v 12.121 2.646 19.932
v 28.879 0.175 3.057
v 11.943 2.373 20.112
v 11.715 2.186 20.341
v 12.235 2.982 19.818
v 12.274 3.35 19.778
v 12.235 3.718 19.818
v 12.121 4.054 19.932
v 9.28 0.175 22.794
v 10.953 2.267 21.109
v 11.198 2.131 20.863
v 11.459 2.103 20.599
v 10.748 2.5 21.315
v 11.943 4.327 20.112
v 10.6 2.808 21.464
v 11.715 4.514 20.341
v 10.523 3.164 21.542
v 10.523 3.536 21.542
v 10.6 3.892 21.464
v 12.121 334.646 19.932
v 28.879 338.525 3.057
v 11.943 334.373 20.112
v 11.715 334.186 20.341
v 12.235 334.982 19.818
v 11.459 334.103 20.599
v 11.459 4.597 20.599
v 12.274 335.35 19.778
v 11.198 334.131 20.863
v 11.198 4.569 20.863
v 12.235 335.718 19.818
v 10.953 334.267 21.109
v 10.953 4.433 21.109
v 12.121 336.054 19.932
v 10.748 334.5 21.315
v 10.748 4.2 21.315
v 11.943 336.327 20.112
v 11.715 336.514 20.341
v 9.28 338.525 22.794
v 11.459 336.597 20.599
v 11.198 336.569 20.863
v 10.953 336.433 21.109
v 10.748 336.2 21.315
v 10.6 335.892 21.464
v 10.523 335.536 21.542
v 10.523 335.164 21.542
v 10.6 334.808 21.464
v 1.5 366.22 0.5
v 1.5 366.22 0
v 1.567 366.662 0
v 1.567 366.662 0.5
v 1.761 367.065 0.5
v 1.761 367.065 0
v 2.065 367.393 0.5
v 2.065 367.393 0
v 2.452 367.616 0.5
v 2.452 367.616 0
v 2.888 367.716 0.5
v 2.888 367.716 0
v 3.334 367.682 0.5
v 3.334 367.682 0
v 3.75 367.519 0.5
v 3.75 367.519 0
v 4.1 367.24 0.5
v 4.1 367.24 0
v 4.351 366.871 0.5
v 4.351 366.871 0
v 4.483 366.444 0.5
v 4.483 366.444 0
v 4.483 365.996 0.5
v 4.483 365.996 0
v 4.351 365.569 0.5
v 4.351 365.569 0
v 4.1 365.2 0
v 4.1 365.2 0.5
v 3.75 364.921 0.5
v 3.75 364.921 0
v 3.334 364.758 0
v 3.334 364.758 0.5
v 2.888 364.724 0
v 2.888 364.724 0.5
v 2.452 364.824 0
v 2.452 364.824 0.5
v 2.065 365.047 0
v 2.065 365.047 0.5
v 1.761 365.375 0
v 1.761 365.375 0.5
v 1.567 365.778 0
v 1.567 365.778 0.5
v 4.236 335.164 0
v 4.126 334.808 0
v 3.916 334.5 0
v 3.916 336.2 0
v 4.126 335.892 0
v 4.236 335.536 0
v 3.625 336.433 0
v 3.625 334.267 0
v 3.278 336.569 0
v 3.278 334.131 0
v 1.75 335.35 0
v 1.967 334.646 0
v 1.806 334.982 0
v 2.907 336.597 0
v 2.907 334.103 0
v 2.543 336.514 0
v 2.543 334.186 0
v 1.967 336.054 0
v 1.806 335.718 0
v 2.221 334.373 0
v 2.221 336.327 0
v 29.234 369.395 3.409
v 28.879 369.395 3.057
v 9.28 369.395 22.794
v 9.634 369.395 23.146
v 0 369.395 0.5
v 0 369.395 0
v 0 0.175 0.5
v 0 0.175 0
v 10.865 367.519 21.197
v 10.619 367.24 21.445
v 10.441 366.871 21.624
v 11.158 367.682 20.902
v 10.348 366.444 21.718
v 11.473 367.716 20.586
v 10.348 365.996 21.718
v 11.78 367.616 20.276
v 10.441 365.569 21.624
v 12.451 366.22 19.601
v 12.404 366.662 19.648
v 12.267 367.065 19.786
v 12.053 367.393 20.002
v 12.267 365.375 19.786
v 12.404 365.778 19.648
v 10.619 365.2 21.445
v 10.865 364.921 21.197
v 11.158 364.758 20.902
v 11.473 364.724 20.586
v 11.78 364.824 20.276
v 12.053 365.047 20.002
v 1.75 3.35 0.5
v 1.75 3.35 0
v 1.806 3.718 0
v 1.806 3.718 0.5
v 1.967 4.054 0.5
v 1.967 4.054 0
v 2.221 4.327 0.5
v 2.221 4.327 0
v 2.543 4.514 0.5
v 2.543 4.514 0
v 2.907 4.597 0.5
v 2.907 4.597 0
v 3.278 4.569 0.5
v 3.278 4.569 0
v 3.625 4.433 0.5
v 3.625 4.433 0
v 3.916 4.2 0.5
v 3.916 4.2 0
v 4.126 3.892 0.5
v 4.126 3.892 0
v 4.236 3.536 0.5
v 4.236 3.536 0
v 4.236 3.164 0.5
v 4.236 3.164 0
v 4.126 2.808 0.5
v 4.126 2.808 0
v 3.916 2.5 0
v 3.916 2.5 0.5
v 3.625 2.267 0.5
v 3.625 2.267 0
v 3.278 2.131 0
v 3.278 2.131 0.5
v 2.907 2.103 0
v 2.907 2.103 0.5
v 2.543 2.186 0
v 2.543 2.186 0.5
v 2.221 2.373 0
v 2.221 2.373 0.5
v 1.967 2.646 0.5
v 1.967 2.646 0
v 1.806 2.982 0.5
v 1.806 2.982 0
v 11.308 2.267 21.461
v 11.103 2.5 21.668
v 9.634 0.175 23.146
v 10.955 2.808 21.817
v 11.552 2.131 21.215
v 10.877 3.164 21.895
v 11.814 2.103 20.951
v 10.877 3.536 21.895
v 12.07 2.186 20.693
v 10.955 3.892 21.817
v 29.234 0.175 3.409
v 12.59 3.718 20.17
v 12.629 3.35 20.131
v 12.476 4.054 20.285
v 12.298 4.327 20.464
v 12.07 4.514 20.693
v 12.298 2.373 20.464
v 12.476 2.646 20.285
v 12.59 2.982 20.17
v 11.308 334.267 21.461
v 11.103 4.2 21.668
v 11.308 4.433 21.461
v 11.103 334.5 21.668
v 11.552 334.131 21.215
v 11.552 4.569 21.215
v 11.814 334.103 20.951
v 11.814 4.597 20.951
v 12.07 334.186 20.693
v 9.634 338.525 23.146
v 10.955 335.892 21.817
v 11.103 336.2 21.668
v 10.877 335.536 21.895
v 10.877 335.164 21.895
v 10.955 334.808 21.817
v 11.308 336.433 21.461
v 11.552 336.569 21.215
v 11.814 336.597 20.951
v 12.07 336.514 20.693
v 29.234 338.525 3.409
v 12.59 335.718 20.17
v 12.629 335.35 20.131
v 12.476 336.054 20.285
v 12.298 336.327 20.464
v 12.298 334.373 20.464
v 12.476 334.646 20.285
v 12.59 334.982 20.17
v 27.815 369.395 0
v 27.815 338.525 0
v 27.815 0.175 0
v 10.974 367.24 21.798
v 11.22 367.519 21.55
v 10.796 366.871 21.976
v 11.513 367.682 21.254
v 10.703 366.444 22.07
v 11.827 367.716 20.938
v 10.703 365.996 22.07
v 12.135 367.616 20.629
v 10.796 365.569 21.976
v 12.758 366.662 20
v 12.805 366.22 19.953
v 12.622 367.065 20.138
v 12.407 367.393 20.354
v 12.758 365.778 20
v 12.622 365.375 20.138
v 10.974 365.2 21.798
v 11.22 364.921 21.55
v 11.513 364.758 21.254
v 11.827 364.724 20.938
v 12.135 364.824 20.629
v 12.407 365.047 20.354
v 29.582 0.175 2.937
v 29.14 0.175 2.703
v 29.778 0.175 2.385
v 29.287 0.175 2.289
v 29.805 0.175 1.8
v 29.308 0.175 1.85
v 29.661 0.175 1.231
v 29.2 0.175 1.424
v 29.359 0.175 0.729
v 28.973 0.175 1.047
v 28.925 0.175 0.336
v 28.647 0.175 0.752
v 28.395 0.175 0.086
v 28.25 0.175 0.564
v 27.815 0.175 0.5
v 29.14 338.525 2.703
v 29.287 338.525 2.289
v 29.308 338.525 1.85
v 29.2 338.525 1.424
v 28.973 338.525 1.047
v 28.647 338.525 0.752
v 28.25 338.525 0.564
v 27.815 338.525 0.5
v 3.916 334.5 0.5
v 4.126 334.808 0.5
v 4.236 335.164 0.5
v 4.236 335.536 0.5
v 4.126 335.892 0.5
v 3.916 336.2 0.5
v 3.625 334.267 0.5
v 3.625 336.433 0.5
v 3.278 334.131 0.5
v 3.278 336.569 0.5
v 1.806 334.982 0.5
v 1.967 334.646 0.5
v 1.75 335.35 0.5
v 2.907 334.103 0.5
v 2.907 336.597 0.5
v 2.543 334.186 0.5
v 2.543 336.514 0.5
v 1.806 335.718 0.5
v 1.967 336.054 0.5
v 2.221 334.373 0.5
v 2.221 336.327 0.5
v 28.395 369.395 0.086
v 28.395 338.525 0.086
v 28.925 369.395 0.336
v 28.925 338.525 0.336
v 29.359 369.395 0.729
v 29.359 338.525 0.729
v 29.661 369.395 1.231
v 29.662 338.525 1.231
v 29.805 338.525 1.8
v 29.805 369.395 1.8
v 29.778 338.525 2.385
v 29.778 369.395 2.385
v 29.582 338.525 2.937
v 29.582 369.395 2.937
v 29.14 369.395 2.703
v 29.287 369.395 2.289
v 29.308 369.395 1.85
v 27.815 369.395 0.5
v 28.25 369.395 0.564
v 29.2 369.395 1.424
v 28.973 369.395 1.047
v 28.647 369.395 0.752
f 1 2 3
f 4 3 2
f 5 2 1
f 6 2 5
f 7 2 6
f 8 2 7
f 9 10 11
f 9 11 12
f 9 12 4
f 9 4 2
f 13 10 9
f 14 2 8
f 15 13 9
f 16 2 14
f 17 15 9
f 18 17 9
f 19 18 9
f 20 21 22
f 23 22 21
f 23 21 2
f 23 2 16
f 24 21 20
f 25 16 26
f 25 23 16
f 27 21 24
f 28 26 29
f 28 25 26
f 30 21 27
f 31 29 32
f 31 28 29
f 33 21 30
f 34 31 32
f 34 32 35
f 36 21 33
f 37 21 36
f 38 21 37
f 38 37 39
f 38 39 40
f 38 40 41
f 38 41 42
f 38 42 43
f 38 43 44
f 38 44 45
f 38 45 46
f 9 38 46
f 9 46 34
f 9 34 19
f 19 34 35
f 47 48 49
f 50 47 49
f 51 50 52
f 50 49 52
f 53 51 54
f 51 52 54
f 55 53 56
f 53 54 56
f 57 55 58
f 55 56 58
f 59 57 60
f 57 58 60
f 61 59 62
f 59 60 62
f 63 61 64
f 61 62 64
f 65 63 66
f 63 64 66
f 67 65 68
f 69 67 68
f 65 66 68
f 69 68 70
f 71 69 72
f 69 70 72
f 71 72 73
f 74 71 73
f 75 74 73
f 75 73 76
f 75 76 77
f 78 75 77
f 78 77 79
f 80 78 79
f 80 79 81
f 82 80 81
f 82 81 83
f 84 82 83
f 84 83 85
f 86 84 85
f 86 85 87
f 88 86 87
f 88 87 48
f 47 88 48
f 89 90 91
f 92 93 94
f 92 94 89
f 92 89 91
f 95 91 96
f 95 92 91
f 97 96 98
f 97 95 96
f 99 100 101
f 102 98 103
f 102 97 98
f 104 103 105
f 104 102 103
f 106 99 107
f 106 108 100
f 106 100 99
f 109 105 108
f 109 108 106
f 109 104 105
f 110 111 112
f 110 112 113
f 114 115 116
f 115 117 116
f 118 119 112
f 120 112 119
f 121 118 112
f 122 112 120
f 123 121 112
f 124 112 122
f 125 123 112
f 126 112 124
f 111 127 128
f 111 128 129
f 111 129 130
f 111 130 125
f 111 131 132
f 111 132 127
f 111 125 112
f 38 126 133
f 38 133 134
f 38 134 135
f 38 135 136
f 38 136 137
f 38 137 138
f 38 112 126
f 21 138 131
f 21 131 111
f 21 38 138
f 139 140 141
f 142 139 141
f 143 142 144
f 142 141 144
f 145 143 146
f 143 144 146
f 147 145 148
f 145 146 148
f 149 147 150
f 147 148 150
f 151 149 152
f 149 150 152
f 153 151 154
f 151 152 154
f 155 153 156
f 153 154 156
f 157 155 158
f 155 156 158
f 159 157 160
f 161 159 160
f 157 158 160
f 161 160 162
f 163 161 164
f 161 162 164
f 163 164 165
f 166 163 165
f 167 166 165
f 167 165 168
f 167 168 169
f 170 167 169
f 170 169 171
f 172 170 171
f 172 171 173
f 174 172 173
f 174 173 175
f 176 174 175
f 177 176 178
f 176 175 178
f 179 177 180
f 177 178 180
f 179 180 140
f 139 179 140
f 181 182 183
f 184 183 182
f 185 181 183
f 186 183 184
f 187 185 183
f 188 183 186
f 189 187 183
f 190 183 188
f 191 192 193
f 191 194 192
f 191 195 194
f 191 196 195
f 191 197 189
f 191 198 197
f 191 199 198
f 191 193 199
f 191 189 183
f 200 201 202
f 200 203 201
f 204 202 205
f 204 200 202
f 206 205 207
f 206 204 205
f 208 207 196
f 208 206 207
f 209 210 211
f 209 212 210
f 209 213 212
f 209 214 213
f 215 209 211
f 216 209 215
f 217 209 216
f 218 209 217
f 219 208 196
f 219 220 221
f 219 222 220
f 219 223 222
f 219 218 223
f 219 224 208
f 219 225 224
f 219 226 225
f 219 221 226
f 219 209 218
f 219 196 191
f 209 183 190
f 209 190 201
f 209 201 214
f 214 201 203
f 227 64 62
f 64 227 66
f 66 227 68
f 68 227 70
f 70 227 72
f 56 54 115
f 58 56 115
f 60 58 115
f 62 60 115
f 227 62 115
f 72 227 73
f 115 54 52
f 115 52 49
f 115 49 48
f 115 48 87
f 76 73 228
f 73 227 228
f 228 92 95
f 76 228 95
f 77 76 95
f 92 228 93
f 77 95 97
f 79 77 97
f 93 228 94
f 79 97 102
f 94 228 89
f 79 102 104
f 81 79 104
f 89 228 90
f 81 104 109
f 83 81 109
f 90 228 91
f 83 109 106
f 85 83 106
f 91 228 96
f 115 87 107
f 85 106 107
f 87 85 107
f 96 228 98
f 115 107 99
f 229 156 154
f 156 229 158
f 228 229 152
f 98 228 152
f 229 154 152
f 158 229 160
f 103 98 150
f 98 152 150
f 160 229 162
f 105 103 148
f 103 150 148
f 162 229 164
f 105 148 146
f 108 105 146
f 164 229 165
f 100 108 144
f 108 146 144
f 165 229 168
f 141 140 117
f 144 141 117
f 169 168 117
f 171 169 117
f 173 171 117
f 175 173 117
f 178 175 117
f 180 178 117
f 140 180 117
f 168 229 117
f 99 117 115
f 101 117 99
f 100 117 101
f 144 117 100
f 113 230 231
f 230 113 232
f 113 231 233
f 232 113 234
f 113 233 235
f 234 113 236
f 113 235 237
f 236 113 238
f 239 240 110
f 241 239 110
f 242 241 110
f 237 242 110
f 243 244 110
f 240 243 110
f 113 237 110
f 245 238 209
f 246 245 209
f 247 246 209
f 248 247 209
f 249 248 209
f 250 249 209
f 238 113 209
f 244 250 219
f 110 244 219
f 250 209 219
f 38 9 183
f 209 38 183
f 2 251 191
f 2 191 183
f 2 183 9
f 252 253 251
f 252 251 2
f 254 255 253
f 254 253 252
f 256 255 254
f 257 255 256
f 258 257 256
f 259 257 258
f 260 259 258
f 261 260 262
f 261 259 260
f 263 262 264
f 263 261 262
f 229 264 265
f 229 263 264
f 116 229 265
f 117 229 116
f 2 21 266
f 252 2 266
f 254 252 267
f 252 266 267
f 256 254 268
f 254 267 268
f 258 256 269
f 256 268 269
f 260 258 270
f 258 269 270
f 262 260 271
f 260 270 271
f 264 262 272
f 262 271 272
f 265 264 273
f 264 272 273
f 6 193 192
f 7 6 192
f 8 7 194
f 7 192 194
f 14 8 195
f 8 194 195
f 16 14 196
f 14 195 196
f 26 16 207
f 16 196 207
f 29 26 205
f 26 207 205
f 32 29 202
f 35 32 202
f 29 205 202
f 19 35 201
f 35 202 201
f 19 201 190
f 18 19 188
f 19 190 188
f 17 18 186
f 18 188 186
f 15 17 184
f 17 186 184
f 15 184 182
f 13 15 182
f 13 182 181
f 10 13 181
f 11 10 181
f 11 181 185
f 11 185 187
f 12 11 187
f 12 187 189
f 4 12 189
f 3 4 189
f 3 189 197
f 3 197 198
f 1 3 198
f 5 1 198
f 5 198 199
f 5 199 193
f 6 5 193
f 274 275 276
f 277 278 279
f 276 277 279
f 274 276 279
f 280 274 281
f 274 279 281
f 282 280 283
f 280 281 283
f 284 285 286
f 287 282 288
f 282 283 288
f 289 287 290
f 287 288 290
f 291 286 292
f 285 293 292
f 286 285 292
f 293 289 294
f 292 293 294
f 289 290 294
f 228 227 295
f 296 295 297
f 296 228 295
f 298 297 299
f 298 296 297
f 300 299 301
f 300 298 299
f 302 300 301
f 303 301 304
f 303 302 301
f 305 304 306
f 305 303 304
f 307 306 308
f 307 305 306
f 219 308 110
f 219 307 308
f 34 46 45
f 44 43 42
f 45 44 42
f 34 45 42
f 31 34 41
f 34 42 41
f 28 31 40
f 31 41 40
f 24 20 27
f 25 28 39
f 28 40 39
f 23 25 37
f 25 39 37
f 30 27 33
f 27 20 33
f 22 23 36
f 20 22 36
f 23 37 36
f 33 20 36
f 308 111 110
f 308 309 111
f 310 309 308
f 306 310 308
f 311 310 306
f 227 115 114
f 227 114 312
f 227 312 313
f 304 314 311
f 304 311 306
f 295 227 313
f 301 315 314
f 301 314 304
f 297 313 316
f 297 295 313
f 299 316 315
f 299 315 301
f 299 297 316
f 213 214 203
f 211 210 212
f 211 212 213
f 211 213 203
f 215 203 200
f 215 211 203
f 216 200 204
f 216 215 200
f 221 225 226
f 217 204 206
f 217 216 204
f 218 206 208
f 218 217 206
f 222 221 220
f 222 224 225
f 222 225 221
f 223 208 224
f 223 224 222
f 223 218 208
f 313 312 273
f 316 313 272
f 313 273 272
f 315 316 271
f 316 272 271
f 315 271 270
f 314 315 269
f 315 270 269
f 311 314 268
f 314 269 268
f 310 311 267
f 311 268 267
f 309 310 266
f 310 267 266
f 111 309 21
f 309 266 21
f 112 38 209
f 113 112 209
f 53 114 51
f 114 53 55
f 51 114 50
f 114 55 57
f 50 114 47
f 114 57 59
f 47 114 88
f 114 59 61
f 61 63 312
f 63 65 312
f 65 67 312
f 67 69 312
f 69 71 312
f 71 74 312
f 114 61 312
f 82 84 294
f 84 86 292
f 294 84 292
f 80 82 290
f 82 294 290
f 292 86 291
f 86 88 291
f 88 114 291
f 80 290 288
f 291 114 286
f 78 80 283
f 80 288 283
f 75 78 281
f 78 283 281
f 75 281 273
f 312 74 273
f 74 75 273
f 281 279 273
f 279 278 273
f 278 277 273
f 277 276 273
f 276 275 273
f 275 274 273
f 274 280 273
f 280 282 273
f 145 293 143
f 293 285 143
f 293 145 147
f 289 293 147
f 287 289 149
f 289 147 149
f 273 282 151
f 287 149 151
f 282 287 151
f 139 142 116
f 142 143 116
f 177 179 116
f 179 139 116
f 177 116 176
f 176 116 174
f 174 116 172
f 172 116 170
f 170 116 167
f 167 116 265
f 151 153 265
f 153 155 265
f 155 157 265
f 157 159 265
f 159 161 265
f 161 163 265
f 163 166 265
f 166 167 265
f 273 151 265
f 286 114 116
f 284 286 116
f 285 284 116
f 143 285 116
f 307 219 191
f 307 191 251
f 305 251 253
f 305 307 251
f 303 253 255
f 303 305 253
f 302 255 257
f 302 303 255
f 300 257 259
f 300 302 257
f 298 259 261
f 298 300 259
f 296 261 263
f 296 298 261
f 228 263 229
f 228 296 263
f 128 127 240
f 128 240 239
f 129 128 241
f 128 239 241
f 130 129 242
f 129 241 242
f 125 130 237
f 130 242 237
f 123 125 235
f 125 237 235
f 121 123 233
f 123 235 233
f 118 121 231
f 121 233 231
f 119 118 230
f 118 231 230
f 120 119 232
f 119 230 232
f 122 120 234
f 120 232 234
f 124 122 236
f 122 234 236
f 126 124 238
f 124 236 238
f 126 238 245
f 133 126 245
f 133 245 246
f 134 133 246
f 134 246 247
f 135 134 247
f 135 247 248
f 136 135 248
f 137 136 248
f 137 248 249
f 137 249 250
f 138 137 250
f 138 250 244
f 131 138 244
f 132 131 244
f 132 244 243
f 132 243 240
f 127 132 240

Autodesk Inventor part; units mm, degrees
ref_plane "YZ Plane" through (0, 0, 0) normal (1, 0, 0) x (0, 1, 0)
ref_plane "XZ Plane" through (0, 0, 0) normal (0, 1, 0) x (-1, 0, 0)
ref_plane "XY Plane" through (0, 0, 0) normal (0, 0, 1) x (1, 0, 0)
sketch "Sketch1" plane through (0, 0, 0) normal (0, 0, 1) x (1, 0, 0)
  line L0 (0, 0) -> (27.815, 0)
  line L1 (27.815, 0) -> (27.815, 338.525)
  line L2 (27.815, 338.525) -> (0, 338.525)
  line L3 (0, 338.525) -> (0, 0)
  dimension "d0" = 27.815
  dimension "d1" = 338.525
extrude "Plate1" add sketch "Sketch1" along normal blind 0.5
sketch "Sketch2" plane through (28.8794, 338.525, 3.057) normal (0.7095707, 0, 0.7046342) x (0, 1, 0)
  line L0 (-338.525, 0) -> (0, 0)
  line L1 (0, 0) -> (0, 27.8153)
  line L2 (0, 27.8153) -> (-338.525, 27.8153)
  line L3 (-338.525, 27.8153) -> (-338.525, 0)
edge flange "Flange1" height 32.62 angle 134.8 thickness 0.5 bend radius 1.5 thickness toward (0.7095707, 0, 0.7046342) relief tear relief width 0.5 relief depth 0.25 edges at (27.815, 169.2625, 0.5) wall of the first edge with corners at (28.8794, 0, 3.057) (28.8794, 338.525, 3.057) (9.2797, 338.525, 22.7939) (9.2797, 0, 22.7939)
bend "Bend1"
corner "Corner1"
sketch "Sketch3" plane through (9.6345, 0, 23.1462) normal (0.7095707, 0, 0.7046342) x (0.7046342, 0, -0.7095707)
  line L0 (0, 338.525) -> (27.8153, 338.525) projected
  line L1 (27.8153, 0) -> (0, 0) projected
  line L2 (0, 0) -> (3, 0) construction
  line L3 (3, 0) -> (3, 3.175) construction
  line L4 (0, 338.525) -> (3, 338.525)
  line L5 (3, 338.525) -> (3, 335.35) construction
  circle A0 centre (3, 335.35) radius 1.25
  line L6 (3, 3.175) -> (3, 3.35) construction
  circle A1 centre (3, 3.35) radius 1.25
  point P0 (9.635, 0)
  dimension "d13" = 3
  dimension "d14" = 3.175
  dimension "d16" = 3
  dimension "d17" = 3.175
  dimension "d18" = 2.5
  dimension "d34" = 0.175
  dimension "d35" = 2.5
extrude "Extrusion1" cut sketch "Sketch3" against normal blind 10
sketch "Sketch4" plane through (0, 0, 0) normal (0, 0, -1) x (-1, 0, 0)
  line L0 (0, 0) -> (-27.815, 0) projected
  line L1 (0, 0) -> (-3, 0) construction
  line L2 (-3, 0) -> (-3, 3.175) construction
  line L3 (0, 338.525) -> (-3, 338.525) construction
  line L4 (0, 338.525) -> (-27.815, 338.525) construction
  line L5 (-3, 338.525) -> (-3, 335.35) construction
  circle A0 centre (-3, 335.35) radius 1.25
  line L6 (-3, 3.175) -> (-3, 3.35) construction
  circle A1 centre (-3, 3.35) radius 1.25
  dimension "d21" = 3
  dimension "d22" = 3.175
  dimension "d24" = 3
  dimension "d25" = 3.175
  dimension "d26" = 2.5
  dimension "d32" = 0.175
  dimension "d33" = 2.5
extrude "Extrusion2" cut sketch "Sketch4" against normal blind 10
sketch "Sketch5" plane through (0, 0, 0) normal (0, 0, -1) x (-1, 0, 0)
  line L0 (0, 0) -> (-49.0059, 0)
  line L1 (-49.0059, 0) -> (-49.0059, 0.175)
  line L2 (-49.0059, 0.175) -> (0, 0.175)
  line L3 (0, 0.175) -> (0, 0)
  dimension "d29" = 0.175
extrude "Extrusion3" cut sketch "Sketch5" against normal blind 100
sketch "Sketch6" plane through (0, 338.525, 0) normal (0, 1, 0) x (1, 0, 0)
  line L0 (0, -0.5) -> (27.815, -0.5) projected
  line L1 (27.815, 0) -> (27.815, -0.5) projected
  line L2 (27.815, 0) -> (0, 0) projected
  line L3 (0, 0) -> (0, -0.5) projected
extrude "Extrusion4" add sketch "Sketch6" along normal blind 30.87
sketch "Sketch7" plane through (27.815, 338.525, 0.5) normal (0, 1, 0) x (1, 0, 0)
  line L0 (1.4191, -2.9093) -> (1.0644, -2.557) projected
  arc A0 (1.4191, -2.9093) -> (0, 0.5) centre (0, -1.5) ccw projected
  line L1 (0, 0.5) -> (0, 0) projected
  arc A1 (1.0644, -2.557) -> (0, 0) centre (0, -1.5) ccw projected
  point P0 (-27.815, 0.5)
extrude "Extrusion5" add sketch "Sketch7" along normal blind 30.87
sketch "Sketch8" plane through (9.2797, 338.525, 22.7939) normal (0, 1, 0) x (0.7095707, 0, 0.7046342)
  line L0 (0.5, 27.8153) -> (0, 27.8153) projected
  line L1 (0, 0) -> (0, 27.8153) projected
  line L2 (0, 0) -> (0.5, 0) projected
  line L3 (0.5, 0) -> (0.5, 27.8153) projected
  point P0 (-22.646, 9.635)
extrude "Extrusion6" add sketch "Sketch8" along normal blind 30.87
sketch "Sketch9" plane through (29.2341, 0.175, 3.4093) normal (0.7095707, 0, 0.7046342) x (0.7046342, 0, -0.7095707)
  circle A0 centre (-24.8153, 335.175) radius 1.25 projected
  point P0 (-18.1803, -0.175)
extrude "Extrusion7" add sketch "Sketch9" against normal up to surface (0.5 mm away)
sketch "Sketch10" plane through (0, 0, 0) normal (0, 0, -1) x (-1, 0, 0)
  circle A0 centre (-3, 335.35) radius 1.25 projected
  point P0 (0, 0)
extrude "Extrusion8" add sketch "Sketch10" against normal up to surface (0.5 mm away)
sketch "Sketch11" plane through (0, 0, 0) normal (0, 0, -1) x (-1, 0, 0)
  line L0 (0, 0.175) -> (0, 369.395) projected
  line L1 (0, 369.395) -> (0, 366.22) construction
  line L2 (0, 366.22) -> (-3, 366.22) construction
  circle A0 centre (-3, 366.22) radius 1.5
  point P0 (0, 0)
  dimension "d46" = 3.175
  dimension "d47" = 3
  dimension "d48" = 3
extrude "Extrusion9" cut sketch "Sketch11" against normal blind 30.87
sketch "Sketch12" plane through (29.2341, 0.175, 3.4093) normal (0.7095707, 0, 0.7046342) x (0.7046342, 0, -0.7095707)
  line L0 (-27.8153, 0) -> (-27.8153, 369.22) projected
  line L1 (-27.8153, 369.22) -> (-27.8153, 366.045) construction
  line L2 (-27.8153, 0) -> (-27.8153, 369.22) construction
  line L3 (-27.8153, 366.045) -> (-24.8153, 366.045) construction
  circle A0 centre (-24.8153, 366.045) radius 1.5
  point P0 (-18.1803, -0.175)
  dimension "d51" = 3.175
  dimension "d52" = 3
  dimension "d53" = 3
extrude "Extrusion10" cut sketch "Sketch12" against normal blind 30.87
equation "\"d2\" = Thickness"
equation "\"d3\" = BendReliefWidth"
equation "\"d4\" = BendReliefDepth"
equation "\"d5\" = MinimumRemnant"
equation "\"d6\" = TransitionRadius"
equation "\"d10\" = CornerReliefSize"
equation "\"d11\" = GapSize"
equation "\"d12\" = JacobiRadiusSize"
equation "\"BendRadius\" = Thickness"
equation "\"BendReliefWidth\" = Thickness"
equation "\"BendReliefDepth\" = 0.5 * Thickness"
equation "\"CornerReliefSize\" = 4 * Thickness"
equation "\"MinimumRemnant\" = 2 * Thickness"
equation "\"TransitionRadius\" = BendRadius"
equation "\"JacobiRadiusSize\" = BendRadius"
equation "\"GapSize\" = Thickness"
equation "\"Thickness\" = 0.5"
properties part number "sideplate part 3" material "Aluminum 6061"
